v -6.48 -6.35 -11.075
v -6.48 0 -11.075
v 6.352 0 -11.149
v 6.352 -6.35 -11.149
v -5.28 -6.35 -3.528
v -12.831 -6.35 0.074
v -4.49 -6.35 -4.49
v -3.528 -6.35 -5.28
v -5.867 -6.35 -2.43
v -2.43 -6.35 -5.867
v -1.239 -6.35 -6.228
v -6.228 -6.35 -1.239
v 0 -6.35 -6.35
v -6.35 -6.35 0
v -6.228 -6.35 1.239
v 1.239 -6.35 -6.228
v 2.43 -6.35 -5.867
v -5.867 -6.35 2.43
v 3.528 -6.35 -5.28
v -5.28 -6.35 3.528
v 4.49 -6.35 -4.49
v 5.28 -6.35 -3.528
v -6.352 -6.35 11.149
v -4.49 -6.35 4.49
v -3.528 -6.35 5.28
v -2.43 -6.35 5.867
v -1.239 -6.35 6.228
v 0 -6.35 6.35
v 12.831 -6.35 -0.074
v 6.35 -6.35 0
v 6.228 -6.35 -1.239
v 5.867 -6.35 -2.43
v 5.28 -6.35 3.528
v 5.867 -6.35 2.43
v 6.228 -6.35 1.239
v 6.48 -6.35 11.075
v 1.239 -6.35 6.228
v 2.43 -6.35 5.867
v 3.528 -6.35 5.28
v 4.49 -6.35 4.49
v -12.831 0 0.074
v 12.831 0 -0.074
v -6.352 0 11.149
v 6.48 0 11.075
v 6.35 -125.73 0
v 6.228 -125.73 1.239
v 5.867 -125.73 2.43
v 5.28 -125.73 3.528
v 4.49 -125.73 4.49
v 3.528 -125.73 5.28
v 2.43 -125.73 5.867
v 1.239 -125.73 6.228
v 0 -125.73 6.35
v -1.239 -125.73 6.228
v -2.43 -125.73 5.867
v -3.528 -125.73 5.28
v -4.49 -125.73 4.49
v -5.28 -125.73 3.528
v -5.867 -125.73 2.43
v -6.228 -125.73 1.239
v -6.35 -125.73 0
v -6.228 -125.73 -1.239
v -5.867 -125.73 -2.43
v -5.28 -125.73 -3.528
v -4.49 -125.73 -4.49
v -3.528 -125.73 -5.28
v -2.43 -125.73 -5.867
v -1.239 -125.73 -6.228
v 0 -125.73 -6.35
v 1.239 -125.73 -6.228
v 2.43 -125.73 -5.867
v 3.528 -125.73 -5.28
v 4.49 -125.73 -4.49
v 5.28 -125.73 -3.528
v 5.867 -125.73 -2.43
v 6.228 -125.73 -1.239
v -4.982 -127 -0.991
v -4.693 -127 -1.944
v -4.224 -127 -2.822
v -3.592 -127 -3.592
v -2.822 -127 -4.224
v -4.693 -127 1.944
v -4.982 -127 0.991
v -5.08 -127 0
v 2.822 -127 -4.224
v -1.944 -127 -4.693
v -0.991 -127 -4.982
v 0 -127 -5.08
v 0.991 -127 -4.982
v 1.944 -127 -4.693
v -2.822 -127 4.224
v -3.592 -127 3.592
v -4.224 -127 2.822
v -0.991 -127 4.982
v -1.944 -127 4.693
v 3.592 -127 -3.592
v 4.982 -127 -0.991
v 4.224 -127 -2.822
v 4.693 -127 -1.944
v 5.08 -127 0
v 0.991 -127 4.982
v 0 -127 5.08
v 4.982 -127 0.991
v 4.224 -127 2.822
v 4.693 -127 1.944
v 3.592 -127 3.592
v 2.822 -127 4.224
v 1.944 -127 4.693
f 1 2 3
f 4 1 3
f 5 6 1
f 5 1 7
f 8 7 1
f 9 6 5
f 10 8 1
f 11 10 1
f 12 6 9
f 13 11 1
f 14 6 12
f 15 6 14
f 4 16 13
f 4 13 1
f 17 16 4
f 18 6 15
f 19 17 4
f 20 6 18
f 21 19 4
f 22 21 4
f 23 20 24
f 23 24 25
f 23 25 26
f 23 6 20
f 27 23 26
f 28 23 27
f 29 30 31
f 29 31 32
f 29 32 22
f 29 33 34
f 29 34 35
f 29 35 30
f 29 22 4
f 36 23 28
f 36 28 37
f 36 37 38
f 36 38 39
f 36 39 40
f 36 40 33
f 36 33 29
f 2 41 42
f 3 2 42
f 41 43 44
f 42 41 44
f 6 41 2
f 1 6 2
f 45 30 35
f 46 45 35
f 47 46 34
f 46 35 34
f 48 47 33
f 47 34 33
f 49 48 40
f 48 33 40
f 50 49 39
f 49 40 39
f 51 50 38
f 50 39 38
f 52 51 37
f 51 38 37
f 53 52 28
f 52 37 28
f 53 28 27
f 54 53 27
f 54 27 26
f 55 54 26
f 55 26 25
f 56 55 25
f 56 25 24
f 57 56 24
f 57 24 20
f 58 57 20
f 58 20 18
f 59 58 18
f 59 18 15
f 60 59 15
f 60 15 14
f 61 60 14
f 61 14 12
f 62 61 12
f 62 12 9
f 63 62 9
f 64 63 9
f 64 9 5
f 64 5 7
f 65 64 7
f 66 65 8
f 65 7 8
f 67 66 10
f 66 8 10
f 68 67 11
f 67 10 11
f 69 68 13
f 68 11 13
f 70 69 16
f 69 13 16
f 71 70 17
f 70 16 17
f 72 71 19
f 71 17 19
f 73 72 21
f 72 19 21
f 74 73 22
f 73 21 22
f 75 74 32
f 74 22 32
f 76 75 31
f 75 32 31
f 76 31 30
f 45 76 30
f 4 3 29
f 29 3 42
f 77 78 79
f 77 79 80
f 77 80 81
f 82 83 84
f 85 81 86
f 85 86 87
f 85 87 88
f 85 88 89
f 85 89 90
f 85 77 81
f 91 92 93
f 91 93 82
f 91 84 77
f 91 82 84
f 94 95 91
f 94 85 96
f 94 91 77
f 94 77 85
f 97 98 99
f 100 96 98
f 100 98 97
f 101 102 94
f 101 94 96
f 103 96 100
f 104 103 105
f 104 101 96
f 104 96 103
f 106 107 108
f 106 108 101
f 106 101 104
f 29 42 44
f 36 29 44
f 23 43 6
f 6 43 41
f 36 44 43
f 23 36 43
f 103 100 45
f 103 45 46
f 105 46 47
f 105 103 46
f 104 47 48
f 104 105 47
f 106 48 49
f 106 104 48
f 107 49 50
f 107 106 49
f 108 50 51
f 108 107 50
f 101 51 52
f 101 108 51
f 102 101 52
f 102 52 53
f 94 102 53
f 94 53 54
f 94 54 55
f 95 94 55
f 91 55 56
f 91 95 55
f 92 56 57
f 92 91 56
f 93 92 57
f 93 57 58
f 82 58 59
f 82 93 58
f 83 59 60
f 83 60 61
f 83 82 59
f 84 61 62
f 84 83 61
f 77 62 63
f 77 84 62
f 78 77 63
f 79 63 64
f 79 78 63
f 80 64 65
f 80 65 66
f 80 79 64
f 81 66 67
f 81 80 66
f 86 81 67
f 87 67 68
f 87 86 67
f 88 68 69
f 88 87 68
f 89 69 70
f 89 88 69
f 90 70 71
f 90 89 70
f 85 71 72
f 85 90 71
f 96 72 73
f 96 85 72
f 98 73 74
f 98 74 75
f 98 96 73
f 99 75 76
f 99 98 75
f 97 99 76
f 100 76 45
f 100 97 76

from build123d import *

# Parameters (mm, degrees)
F1_DEPTH = 6.35
F2_R     = 6.35
F3_DEPTH = 127
F4_SIZE  = 1.27


with BuildPart() as f1:
    # F0 (on Front) → F1 (new body)
    with BuildSketch(Plane.XZ):
        Polygon((6.351873, -11.149167), (12.831398, -0.0737), (6.479525, 11.075467), (-6.351873, 11.149167), (-12.831398, 0.0737), (-6.479525, -11.075467), align=None)
    extrude(amount=F1_DEPTH)

    # F2 (on Front) → F3 (join)
    with BuildSketch(Plane.XZ):
        Circle(F2_R)
    extrude(amount=F3_DEPTH)

    # F4
    f4_edges = [f1.edges().sort_by_distance(p)[0] for p in [
        (-6.35, -127, 0),
    ]]
    chamfer(f4_edges, length=F4_SIZE)


solid = f1.part
